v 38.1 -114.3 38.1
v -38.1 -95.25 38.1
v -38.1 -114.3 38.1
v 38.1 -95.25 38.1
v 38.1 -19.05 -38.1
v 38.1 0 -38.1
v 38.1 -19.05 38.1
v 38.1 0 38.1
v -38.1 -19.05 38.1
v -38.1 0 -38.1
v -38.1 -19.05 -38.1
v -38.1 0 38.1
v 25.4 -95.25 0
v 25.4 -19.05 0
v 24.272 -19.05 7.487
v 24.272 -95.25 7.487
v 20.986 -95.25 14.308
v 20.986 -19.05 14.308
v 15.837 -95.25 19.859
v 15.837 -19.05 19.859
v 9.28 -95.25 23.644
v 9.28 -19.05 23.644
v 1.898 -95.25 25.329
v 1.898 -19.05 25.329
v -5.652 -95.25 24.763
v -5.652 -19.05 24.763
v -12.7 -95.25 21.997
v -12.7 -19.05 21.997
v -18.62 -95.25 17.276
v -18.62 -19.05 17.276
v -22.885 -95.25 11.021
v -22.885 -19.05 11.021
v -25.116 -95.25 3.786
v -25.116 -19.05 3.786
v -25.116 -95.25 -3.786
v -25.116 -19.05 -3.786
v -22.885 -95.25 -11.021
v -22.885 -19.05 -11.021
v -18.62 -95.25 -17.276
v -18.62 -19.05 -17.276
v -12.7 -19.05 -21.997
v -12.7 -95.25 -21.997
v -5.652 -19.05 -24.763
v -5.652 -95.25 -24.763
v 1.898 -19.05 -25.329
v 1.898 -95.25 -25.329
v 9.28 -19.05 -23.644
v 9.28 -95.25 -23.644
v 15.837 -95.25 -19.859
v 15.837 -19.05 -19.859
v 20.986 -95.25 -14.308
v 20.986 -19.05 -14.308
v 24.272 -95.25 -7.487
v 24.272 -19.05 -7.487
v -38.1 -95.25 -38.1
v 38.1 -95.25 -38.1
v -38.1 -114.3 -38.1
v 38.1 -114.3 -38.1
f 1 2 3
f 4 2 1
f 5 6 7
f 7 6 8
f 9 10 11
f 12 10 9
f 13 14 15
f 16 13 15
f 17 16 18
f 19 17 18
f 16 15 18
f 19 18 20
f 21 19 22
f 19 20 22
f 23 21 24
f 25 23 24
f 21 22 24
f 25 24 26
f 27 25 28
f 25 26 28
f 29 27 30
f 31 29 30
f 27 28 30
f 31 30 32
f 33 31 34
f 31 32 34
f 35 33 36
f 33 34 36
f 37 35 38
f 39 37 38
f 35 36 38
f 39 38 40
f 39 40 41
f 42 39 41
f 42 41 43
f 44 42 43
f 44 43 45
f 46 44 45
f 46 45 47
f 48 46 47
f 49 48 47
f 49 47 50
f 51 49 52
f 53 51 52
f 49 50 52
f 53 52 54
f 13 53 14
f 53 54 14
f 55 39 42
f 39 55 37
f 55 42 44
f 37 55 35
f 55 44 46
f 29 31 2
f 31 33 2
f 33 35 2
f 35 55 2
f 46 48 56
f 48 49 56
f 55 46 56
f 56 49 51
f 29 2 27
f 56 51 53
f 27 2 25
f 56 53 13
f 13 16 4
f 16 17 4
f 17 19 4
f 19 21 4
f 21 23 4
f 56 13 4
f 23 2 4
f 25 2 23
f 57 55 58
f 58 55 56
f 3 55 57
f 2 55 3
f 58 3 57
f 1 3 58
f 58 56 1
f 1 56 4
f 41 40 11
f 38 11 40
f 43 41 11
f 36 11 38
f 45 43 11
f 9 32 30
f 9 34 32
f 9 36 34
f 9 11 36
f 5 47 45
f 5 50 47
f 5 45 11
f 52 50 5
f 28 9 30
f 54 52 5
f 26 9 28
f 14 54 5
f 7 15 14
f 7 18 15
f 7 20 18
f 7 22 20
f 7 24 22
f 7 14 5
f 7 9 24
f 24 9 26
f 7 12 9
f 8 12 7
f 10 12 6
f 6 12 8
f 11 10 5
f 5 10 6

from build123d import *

# Parameters (mm, degrees)
F0_W     = 76.2
F0_H     = 76.2
F1_DEPTH = 19.05
F2_R     = 25.4
F3_DEPTH = 76.2
F4_W     = 78.3899585484
F4_H     = 76.2
F4_R     = 25.4
F5_DEPTH = 19.05
F7_W     = 76.2
F7_H     = 76.2
F7_R     = 25.4
F8_DEPTH = 19.05


with BuildPart() as f1:
    # F0 (on Front) → F1 (new body)
    with BuildSketch(Plane.XZ):
        Rectangle(F0_W, F0_H)
    extrude(amount=F1_DEPTH)

    # F2 (on face) → F3 (join)
    with BuildSketch(Plane.XZ.offset(19.05)):
        Circle(F2_R)
    extrude(amount=F3_DEPTH)

    # F7 (on face) → F8 (join)
    with BuildSketch(Plane.XZ.offset(95.25)):
        Rectangle(F7_W, F7_H)
        Circle(F7_R, mode=Mode.SUBTRACT)
        Circle(F7_R)
    extrude(amount=F8_DEPTH)


with BuildPart() as f5:
    # F4 (on face) → F5 (new body)
    with BuildSketch(Plane.XZ.offset(95.25)):
        Rectangle(F4_W, F4_H)
        Circle(F4_R, mode=Mode.SUBTRACT)
    extrude(amount=F5_DEPTH)


solid = f1.part
